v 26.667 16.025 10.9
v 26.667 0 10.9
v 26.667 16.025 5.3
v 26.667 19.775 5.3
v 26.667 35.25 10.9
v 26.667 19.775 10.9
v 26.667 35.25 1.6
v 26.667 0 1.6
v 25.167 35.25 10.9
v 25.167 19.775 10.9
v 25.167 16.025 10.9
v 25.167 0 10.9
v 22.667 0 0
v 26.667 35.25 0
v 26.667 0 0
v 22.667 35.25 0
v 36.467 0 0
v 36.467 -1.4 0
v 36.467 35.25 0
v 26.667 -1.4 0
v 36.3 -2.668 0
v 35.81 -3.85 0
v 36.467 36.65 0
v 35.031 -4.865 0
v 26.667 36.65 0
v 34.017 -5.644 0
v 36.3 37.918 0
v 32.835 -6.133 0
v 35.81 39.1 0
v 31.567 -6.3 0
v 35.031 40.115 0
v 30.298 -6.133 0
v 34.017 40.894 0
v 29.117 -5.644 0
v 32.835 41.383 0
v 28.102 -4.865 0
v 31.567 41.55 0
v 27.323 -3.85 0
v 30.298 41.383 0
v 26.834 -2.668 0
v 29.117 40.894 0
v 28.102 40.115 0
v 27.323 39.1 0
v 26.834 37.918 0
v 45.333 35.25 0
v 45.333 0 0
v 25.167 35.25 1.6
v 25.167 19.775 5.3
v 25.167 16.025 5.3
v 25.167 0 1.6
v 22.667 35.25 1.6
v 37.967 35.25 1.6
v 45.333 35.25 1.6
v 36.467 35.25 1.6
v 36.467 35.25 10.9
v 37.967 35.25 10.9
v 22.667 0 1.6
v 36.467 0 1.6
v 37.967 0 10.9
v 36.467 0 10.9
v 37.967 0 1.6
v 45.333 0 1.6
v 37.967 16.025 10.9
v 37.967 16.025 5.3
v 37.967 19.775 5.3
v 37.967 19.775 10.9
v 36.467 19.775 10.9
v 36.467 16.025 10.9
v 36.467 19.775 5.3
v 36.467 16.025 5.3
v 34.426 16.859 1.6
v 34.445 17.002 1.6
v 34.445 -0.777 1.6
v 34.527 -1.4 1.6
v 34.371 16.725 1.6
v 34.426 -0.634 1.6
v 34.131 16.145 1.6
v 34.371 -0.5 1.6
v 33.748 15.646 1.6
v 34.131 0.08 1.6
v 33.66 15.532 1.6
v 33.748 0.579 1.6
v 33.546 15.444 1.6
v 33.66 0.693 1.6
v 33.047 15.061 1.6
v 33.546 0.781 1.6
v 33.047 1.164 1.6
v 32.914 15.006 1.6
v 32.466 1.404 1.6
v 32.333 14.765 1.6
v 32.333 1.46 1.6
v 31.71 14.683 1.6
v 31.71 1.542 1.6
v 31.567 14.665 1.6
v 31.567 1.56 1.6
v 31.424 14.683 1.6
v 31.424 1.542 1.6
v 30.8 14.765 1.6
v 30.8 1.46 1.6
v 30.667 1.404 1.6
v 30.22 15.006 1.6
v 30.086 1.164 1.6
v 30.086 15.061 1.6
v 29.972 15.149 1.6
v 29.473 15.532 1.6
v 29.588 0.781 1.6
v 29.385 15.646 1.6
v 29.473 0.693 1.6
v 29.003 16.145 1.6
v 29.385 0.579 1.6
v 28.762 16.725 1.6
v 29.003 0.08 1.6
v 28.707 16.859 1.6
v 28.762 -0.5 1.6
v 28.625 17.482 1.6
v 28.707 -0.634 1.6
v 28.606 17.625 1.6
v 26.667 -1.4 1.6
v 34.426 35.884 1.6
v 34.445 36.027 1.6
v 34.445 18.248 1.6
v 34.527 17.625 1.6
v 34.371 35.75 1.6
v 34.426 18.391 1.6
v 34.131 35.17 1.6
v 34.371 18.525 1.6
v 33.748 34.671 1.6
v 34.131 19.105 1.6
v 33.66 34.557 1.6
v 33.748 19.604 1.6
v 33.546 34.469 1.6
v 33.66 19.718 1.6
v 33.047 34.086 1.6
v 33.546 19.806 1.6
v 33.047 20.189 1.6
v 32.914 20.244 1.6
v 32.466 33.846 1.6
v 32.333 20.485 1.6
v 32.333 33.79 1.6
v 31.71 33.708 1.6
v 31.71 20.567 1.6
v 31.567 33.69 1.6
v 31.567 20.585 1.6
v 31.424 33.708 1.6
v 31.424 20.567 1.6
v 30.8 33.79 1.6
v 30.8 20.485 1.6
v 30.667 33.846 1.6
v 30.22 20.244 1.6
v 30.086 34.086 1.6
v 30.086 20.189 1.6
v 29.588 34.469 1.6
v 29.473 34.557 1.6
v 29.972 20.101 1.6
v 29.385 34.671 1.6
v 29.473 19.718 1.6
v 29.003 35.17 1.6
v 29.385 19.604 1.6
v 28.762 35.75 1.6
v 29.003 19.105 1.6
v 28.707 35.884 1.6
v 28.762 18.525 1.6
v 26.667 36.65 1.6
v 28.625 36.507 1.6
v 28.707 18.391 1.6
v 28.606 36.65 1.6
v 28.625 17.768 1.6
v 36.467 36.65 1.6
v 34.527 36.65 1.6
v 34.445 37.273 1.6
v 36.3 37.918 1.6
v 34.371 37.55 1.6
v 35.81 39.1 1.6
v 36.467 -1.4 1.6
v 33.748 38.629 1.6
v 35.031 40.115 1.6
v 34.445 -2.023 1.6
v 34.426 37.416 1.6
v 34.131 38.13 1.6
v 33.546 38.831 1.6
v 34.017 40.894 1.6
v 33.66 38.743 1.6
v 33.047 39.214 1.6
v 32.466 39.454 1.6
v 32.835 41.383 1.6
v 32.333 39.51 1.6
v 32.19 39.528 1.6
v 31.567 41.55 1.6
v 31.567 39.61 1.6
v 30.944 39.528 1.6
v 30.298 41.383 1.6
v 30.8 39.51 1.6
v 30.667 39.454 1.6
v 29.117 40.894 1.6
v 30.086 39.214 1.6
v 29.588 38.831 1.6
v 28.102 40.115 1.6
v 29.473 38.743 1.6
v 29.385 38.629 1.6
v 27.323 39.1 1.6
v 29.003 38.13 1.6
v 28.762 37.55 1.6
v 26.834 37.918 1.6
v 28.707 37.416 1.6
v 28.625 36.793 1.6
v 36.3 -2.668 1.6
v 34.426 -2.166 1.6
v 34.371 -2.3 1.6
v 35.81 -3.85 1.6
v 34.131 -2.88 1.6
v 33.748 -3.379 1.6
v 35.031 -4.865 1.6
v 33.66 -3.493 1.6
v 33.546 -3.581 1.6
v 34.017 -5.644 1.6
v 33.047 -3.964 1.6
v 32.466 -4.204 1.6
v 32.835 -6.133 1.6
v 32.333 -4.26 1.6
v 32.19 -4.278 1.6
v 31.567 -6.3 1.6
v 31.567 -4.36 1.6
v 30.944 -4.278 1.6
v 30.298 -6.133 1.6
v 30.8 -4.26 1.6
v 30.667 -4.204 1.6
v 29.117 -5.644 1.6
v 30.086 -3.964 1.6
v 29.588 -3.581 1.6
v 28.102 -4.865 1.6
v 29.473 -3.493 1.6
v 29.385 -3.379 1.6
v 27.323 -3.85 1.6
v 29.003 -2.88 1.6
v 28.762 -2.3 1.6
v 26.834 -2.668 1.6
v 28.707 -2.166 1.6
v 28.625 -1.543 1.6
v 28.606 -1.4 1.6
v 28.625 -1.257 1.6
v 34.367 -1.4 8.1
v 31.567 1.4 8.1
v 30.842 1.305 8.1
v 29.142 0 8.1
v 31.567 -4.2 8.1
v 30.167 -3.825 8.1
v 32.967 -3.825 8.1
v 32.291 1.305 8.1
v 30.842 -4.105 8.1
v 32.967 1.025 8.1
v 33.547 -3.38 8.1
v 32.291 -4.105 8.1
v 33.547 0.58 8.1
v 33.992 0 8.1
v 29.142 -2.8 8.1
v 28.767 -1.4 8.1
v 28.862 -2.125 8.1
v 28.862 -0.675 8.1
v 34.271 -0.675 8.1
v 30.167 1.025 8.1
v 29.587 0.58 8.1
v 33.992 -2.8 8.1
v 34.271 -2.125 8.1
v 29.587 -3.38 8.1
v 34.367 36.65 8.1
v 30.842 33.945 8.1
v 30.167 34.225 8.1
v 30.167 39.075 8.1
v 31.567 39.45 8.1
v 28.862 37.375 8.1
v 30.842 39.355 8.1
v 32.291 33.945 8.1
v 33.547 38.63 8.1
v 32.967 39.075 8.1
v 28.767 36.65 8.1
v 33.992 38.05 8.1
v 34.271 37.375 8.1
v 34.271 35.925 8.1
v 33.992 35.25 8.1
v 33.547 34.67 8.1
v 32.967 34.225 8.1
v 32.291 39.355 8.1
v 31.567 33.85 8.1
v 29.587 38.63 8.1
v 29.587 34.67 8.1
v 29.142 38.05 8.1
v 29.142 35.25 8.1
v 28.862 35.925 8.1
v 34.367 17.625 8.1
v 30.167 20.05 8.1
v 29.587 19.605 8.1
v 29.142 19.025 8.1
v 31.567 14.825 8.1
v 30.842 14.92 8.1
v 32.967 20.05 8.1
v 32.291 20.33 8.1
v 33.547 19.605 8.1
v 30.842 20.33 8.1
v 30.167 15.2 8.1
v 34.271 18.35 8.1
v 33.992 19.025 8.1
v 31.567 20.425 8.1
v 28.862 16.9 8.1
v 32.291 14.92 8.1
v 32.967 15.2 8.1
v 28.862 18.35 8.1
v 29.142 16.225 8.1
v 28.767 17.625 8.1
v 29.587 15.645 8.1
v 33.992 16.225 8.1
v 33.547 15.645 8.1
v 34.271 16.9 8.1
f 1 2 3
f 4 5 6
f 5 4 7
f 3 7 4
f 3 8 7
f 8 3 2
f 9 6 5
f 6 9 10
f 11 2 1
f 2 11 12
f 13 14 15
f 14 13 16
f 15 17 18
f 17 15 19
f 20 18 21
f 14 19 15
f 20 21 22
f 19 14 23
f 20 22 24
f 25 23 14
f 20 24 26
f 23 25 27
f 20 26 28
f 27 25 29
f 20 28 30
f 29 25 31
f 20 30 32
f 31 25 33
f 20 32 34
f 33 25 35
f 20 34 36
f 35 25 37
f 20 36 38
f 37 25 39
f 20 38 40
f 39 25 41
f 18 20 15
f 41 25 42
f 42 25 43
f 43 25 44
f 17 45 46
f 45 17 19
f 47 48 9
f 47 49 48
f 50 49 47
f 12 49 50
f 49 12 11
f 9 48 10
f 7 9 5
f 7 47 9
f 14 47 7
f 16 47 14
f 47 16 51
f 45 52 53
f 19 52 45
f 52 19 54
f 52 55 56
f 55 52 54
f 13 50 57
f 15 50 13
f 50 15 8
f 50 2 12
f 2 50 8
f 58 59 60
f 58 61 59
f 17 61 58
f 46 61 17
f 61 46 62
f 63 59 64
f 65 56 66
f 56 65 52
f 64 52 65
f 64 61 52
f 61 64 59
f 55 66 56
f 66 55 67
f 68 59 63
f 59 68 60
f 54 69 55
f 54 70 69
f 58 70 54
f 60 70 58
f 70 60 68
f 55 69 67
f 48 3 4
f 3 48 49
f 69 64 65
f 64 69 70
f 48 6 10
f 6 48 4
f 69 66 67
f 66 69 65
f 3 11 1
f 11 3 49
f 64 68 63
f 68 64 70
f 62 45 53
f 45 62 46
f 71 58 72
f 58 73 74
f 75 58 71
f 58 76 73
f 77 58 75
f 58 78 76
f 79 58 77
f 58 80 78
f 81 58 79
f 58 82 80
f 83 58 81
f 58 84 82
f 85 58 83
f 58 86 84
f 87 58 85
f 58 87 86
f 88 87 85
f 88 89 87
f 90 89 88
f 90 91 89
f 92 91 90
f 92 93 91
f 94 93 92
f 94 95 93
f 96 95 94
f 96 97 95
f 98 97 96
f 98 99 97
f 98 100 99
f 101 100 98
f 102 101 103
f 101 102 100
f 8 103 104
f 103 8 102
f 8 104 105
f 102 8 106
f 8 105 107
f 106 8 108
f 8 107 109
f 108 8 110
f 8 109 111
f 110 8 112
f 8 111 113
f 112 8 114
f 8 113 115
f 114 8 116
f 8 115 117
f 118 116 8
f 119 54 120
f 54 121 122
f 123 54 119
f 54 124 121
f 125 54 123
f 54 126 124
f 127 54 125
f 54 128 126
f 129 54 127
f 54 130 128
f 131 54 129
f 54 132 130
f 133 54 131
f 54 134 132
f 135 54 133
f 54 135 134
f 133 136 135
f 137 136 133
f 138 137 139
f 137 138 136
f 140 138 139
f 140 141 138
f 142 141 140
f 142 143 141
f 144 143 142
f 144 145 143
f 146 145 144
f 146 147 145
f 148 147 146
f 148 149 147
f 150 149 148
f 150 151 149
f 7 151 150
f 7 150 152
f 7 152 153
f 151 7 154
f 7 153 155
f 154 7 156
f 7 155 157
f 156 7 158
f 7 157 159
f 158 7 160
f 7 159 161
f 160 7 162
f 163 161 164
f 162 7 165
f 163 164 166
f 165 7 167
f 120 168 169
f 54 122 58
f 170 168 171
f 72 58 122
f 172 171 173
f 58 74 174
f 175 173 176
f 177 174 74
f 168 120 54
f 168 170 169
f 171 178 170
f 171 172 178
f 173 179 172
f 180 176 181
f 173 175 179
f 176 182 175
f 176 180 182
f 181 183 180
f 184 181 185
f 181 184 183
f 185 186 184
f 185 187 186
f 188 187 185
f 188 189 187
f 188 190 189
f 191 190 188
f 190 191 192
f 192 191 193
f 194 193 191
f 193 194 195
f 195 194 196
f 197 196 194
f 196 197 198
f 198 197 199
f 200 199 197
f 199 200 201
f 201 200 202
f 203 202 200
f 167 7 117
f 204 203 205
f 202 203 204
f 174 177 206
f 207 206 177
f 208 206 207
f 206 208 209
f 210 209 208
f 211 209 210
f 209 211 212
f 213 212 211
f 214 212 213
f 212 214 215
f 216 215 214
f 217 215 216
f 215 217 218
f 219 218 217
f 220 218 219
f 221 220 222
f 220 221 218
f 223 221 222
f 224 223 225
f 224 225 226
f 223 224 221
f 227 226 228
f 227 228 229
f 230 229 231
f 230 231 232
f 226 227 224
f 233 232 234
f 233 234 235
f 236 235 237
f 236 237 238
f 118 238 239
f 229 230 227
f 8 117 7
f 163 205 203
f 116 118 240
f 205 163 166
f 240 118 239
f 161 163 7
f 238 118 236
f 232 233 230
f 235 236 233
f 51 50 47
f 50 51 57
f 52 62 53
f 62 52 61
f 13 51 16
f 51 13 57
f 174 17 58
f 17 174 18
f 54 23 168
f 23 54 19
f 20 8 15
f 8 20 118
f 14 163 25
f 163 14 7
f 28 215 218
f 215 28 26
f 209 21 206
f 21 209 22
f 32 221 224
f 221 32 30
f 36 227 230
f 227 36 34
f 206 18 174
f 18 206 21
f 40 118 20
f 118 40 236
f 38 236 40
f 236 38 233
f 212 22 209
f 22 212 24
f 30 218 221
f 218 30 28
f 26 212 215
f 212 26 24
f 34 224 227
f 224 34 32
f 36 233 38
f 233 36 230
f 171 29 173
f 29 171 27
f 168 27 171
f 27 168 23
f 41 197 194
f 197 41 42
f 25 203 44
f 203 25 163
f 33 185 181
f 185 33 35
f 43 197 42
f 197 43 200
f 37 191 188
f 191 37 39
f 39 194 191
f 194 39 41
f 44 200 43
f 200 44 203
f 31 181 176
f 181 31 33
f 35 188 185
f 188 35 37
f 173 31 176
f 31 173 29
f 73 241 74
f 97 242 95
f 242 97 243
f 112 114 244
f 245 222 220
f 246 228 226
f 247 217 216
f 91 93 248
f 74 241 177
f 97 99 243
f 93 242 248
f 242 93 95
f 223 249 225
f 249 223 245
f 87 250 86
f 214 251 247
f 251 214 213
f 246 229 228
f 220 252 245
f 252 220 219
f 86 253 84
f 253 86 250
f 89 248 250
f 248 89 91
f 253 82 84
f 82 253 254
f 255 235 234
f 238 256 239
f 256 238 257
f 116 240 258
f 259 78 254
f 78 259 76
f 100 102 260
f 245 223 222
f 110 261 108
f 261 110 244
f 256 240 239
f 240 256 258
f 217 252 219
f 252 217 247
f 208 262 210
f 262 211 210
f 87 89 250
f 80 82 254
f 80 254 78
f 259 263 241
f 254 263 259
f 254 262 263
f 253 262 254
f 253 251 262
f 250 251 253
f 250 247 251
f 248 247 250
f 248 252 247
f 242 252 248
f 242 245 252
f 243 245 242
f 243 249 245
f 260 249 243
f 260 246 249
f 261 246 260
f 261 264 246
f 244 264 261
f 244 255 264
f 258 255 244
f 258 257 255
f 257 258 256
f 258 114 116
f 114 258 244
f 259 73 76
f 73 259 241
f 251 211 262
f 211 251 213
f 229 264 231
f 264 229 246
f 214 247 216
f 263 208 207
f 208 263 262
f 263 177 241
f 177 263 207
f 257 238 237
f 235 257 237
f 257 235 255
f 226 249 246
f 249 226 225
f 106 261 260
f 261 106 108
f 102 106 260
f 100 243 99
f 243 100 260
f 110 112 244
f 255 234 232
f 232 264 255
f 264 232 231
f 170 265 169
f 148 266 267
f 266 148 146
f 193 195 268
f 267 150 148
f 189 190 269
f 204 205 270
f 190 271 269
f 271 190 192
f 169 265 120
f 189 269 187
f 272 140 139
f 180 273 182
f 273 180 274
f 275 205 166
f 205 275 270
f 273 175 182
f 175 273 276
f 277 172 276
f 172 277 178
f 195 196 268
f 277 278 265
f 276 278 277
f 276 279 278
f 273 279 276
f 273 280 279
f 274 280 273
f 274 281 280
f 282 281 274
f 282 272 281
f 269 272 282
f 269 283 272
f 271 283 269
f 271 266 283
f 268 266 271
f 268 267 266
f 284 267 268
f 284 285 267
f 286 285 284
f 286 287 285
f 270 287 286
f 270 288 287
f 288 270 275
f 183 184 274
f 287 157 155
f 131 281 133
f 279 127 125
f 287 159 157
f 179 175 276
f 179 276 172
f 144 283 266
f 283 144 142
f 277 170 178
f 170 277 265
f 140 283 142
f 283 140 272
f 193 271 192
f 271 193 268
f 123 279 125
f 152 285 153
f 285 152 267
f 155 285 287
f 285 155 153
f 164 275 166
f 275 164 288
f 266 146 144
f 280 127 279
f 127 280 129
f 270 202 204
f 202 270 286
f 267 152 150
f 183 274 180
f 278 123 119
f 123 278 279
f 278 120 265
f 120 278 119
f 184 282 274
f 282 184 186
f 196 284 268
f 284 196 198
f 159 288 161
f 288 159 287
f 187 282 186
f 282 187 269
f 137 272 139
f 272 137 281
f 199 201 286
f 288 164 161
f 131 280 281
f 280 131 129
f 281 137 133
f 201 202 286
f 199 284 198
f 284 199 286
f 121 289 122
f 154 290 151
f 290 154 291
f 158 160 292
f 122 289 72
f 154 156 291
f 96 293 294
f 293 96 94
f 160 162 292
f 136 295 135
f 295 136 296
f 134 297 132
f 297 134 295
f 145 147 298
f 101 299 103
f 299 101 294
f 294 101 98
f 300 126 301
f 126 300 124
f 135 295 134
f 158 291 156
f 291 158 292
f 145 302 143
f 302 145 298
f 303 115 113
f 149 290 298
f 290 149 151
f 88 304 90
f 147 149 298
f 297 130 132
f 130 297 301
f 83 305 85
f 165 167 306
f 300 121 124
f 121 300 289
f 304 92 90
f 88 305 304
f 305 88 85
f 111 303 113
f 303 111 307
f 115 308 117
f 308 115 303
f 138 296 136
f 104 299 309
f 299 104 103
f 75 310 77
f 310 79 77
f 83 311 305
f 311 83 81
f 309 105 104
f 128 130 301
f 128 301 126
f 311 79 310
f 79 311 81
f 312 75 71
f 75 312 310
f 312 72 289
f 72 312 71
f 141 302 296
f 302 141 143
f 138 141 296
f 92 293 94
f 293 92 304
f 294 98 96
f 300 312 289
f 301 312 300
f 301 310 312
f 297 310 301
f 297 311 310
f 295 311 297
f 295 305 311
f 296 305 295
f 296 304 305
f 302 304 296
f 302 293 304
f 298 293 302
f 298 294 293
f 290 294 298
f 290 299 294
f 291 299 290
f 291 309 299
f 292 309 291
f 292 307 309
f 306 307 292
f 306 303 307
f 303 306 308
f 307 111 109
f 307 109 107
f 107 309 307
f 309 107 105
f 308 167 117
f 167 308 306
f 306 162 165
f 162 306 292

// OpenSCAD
// number of faces in circle
$fn=24; 

// number of rows
numerical_slider = 1; // [0:10]



for ( i = [1 : numerical_slider] )
{
translate([i*(34/3*2),0,0])
union()
	{
		cube([(34/3*2),35.25,1.6]);
		translate([4,-1.4,0])cube([9.8,38.05,1.6]);
		translate([8.9,-1.4,0])cylinder(h = 1.6, r=4.9);
		translate([8.9,36.65,0])cylinder(h = 1.6, r=4.9);

		translate([8.9,-1.4,0])cylinder(h = 8.1, r1=3, r2=2.8);
		translate([8.9,36.65,0])cylinder(h = 8.1, r1=3, r2=2.8);
		translate([8.9,17.625,0])cylinder(h = 8.1, r1=3, r2=2.8);

		difference() {
		union() {
		translate([2.5,0,0])cube([1.5,35.25,10.9]);
		translate([13.8,0,0])cube([1.5,35.25,10.9]);
		}
		translate([0,16.025,5.3])cube([35.25,3.75,5.7]);
		}
	}
	
}
